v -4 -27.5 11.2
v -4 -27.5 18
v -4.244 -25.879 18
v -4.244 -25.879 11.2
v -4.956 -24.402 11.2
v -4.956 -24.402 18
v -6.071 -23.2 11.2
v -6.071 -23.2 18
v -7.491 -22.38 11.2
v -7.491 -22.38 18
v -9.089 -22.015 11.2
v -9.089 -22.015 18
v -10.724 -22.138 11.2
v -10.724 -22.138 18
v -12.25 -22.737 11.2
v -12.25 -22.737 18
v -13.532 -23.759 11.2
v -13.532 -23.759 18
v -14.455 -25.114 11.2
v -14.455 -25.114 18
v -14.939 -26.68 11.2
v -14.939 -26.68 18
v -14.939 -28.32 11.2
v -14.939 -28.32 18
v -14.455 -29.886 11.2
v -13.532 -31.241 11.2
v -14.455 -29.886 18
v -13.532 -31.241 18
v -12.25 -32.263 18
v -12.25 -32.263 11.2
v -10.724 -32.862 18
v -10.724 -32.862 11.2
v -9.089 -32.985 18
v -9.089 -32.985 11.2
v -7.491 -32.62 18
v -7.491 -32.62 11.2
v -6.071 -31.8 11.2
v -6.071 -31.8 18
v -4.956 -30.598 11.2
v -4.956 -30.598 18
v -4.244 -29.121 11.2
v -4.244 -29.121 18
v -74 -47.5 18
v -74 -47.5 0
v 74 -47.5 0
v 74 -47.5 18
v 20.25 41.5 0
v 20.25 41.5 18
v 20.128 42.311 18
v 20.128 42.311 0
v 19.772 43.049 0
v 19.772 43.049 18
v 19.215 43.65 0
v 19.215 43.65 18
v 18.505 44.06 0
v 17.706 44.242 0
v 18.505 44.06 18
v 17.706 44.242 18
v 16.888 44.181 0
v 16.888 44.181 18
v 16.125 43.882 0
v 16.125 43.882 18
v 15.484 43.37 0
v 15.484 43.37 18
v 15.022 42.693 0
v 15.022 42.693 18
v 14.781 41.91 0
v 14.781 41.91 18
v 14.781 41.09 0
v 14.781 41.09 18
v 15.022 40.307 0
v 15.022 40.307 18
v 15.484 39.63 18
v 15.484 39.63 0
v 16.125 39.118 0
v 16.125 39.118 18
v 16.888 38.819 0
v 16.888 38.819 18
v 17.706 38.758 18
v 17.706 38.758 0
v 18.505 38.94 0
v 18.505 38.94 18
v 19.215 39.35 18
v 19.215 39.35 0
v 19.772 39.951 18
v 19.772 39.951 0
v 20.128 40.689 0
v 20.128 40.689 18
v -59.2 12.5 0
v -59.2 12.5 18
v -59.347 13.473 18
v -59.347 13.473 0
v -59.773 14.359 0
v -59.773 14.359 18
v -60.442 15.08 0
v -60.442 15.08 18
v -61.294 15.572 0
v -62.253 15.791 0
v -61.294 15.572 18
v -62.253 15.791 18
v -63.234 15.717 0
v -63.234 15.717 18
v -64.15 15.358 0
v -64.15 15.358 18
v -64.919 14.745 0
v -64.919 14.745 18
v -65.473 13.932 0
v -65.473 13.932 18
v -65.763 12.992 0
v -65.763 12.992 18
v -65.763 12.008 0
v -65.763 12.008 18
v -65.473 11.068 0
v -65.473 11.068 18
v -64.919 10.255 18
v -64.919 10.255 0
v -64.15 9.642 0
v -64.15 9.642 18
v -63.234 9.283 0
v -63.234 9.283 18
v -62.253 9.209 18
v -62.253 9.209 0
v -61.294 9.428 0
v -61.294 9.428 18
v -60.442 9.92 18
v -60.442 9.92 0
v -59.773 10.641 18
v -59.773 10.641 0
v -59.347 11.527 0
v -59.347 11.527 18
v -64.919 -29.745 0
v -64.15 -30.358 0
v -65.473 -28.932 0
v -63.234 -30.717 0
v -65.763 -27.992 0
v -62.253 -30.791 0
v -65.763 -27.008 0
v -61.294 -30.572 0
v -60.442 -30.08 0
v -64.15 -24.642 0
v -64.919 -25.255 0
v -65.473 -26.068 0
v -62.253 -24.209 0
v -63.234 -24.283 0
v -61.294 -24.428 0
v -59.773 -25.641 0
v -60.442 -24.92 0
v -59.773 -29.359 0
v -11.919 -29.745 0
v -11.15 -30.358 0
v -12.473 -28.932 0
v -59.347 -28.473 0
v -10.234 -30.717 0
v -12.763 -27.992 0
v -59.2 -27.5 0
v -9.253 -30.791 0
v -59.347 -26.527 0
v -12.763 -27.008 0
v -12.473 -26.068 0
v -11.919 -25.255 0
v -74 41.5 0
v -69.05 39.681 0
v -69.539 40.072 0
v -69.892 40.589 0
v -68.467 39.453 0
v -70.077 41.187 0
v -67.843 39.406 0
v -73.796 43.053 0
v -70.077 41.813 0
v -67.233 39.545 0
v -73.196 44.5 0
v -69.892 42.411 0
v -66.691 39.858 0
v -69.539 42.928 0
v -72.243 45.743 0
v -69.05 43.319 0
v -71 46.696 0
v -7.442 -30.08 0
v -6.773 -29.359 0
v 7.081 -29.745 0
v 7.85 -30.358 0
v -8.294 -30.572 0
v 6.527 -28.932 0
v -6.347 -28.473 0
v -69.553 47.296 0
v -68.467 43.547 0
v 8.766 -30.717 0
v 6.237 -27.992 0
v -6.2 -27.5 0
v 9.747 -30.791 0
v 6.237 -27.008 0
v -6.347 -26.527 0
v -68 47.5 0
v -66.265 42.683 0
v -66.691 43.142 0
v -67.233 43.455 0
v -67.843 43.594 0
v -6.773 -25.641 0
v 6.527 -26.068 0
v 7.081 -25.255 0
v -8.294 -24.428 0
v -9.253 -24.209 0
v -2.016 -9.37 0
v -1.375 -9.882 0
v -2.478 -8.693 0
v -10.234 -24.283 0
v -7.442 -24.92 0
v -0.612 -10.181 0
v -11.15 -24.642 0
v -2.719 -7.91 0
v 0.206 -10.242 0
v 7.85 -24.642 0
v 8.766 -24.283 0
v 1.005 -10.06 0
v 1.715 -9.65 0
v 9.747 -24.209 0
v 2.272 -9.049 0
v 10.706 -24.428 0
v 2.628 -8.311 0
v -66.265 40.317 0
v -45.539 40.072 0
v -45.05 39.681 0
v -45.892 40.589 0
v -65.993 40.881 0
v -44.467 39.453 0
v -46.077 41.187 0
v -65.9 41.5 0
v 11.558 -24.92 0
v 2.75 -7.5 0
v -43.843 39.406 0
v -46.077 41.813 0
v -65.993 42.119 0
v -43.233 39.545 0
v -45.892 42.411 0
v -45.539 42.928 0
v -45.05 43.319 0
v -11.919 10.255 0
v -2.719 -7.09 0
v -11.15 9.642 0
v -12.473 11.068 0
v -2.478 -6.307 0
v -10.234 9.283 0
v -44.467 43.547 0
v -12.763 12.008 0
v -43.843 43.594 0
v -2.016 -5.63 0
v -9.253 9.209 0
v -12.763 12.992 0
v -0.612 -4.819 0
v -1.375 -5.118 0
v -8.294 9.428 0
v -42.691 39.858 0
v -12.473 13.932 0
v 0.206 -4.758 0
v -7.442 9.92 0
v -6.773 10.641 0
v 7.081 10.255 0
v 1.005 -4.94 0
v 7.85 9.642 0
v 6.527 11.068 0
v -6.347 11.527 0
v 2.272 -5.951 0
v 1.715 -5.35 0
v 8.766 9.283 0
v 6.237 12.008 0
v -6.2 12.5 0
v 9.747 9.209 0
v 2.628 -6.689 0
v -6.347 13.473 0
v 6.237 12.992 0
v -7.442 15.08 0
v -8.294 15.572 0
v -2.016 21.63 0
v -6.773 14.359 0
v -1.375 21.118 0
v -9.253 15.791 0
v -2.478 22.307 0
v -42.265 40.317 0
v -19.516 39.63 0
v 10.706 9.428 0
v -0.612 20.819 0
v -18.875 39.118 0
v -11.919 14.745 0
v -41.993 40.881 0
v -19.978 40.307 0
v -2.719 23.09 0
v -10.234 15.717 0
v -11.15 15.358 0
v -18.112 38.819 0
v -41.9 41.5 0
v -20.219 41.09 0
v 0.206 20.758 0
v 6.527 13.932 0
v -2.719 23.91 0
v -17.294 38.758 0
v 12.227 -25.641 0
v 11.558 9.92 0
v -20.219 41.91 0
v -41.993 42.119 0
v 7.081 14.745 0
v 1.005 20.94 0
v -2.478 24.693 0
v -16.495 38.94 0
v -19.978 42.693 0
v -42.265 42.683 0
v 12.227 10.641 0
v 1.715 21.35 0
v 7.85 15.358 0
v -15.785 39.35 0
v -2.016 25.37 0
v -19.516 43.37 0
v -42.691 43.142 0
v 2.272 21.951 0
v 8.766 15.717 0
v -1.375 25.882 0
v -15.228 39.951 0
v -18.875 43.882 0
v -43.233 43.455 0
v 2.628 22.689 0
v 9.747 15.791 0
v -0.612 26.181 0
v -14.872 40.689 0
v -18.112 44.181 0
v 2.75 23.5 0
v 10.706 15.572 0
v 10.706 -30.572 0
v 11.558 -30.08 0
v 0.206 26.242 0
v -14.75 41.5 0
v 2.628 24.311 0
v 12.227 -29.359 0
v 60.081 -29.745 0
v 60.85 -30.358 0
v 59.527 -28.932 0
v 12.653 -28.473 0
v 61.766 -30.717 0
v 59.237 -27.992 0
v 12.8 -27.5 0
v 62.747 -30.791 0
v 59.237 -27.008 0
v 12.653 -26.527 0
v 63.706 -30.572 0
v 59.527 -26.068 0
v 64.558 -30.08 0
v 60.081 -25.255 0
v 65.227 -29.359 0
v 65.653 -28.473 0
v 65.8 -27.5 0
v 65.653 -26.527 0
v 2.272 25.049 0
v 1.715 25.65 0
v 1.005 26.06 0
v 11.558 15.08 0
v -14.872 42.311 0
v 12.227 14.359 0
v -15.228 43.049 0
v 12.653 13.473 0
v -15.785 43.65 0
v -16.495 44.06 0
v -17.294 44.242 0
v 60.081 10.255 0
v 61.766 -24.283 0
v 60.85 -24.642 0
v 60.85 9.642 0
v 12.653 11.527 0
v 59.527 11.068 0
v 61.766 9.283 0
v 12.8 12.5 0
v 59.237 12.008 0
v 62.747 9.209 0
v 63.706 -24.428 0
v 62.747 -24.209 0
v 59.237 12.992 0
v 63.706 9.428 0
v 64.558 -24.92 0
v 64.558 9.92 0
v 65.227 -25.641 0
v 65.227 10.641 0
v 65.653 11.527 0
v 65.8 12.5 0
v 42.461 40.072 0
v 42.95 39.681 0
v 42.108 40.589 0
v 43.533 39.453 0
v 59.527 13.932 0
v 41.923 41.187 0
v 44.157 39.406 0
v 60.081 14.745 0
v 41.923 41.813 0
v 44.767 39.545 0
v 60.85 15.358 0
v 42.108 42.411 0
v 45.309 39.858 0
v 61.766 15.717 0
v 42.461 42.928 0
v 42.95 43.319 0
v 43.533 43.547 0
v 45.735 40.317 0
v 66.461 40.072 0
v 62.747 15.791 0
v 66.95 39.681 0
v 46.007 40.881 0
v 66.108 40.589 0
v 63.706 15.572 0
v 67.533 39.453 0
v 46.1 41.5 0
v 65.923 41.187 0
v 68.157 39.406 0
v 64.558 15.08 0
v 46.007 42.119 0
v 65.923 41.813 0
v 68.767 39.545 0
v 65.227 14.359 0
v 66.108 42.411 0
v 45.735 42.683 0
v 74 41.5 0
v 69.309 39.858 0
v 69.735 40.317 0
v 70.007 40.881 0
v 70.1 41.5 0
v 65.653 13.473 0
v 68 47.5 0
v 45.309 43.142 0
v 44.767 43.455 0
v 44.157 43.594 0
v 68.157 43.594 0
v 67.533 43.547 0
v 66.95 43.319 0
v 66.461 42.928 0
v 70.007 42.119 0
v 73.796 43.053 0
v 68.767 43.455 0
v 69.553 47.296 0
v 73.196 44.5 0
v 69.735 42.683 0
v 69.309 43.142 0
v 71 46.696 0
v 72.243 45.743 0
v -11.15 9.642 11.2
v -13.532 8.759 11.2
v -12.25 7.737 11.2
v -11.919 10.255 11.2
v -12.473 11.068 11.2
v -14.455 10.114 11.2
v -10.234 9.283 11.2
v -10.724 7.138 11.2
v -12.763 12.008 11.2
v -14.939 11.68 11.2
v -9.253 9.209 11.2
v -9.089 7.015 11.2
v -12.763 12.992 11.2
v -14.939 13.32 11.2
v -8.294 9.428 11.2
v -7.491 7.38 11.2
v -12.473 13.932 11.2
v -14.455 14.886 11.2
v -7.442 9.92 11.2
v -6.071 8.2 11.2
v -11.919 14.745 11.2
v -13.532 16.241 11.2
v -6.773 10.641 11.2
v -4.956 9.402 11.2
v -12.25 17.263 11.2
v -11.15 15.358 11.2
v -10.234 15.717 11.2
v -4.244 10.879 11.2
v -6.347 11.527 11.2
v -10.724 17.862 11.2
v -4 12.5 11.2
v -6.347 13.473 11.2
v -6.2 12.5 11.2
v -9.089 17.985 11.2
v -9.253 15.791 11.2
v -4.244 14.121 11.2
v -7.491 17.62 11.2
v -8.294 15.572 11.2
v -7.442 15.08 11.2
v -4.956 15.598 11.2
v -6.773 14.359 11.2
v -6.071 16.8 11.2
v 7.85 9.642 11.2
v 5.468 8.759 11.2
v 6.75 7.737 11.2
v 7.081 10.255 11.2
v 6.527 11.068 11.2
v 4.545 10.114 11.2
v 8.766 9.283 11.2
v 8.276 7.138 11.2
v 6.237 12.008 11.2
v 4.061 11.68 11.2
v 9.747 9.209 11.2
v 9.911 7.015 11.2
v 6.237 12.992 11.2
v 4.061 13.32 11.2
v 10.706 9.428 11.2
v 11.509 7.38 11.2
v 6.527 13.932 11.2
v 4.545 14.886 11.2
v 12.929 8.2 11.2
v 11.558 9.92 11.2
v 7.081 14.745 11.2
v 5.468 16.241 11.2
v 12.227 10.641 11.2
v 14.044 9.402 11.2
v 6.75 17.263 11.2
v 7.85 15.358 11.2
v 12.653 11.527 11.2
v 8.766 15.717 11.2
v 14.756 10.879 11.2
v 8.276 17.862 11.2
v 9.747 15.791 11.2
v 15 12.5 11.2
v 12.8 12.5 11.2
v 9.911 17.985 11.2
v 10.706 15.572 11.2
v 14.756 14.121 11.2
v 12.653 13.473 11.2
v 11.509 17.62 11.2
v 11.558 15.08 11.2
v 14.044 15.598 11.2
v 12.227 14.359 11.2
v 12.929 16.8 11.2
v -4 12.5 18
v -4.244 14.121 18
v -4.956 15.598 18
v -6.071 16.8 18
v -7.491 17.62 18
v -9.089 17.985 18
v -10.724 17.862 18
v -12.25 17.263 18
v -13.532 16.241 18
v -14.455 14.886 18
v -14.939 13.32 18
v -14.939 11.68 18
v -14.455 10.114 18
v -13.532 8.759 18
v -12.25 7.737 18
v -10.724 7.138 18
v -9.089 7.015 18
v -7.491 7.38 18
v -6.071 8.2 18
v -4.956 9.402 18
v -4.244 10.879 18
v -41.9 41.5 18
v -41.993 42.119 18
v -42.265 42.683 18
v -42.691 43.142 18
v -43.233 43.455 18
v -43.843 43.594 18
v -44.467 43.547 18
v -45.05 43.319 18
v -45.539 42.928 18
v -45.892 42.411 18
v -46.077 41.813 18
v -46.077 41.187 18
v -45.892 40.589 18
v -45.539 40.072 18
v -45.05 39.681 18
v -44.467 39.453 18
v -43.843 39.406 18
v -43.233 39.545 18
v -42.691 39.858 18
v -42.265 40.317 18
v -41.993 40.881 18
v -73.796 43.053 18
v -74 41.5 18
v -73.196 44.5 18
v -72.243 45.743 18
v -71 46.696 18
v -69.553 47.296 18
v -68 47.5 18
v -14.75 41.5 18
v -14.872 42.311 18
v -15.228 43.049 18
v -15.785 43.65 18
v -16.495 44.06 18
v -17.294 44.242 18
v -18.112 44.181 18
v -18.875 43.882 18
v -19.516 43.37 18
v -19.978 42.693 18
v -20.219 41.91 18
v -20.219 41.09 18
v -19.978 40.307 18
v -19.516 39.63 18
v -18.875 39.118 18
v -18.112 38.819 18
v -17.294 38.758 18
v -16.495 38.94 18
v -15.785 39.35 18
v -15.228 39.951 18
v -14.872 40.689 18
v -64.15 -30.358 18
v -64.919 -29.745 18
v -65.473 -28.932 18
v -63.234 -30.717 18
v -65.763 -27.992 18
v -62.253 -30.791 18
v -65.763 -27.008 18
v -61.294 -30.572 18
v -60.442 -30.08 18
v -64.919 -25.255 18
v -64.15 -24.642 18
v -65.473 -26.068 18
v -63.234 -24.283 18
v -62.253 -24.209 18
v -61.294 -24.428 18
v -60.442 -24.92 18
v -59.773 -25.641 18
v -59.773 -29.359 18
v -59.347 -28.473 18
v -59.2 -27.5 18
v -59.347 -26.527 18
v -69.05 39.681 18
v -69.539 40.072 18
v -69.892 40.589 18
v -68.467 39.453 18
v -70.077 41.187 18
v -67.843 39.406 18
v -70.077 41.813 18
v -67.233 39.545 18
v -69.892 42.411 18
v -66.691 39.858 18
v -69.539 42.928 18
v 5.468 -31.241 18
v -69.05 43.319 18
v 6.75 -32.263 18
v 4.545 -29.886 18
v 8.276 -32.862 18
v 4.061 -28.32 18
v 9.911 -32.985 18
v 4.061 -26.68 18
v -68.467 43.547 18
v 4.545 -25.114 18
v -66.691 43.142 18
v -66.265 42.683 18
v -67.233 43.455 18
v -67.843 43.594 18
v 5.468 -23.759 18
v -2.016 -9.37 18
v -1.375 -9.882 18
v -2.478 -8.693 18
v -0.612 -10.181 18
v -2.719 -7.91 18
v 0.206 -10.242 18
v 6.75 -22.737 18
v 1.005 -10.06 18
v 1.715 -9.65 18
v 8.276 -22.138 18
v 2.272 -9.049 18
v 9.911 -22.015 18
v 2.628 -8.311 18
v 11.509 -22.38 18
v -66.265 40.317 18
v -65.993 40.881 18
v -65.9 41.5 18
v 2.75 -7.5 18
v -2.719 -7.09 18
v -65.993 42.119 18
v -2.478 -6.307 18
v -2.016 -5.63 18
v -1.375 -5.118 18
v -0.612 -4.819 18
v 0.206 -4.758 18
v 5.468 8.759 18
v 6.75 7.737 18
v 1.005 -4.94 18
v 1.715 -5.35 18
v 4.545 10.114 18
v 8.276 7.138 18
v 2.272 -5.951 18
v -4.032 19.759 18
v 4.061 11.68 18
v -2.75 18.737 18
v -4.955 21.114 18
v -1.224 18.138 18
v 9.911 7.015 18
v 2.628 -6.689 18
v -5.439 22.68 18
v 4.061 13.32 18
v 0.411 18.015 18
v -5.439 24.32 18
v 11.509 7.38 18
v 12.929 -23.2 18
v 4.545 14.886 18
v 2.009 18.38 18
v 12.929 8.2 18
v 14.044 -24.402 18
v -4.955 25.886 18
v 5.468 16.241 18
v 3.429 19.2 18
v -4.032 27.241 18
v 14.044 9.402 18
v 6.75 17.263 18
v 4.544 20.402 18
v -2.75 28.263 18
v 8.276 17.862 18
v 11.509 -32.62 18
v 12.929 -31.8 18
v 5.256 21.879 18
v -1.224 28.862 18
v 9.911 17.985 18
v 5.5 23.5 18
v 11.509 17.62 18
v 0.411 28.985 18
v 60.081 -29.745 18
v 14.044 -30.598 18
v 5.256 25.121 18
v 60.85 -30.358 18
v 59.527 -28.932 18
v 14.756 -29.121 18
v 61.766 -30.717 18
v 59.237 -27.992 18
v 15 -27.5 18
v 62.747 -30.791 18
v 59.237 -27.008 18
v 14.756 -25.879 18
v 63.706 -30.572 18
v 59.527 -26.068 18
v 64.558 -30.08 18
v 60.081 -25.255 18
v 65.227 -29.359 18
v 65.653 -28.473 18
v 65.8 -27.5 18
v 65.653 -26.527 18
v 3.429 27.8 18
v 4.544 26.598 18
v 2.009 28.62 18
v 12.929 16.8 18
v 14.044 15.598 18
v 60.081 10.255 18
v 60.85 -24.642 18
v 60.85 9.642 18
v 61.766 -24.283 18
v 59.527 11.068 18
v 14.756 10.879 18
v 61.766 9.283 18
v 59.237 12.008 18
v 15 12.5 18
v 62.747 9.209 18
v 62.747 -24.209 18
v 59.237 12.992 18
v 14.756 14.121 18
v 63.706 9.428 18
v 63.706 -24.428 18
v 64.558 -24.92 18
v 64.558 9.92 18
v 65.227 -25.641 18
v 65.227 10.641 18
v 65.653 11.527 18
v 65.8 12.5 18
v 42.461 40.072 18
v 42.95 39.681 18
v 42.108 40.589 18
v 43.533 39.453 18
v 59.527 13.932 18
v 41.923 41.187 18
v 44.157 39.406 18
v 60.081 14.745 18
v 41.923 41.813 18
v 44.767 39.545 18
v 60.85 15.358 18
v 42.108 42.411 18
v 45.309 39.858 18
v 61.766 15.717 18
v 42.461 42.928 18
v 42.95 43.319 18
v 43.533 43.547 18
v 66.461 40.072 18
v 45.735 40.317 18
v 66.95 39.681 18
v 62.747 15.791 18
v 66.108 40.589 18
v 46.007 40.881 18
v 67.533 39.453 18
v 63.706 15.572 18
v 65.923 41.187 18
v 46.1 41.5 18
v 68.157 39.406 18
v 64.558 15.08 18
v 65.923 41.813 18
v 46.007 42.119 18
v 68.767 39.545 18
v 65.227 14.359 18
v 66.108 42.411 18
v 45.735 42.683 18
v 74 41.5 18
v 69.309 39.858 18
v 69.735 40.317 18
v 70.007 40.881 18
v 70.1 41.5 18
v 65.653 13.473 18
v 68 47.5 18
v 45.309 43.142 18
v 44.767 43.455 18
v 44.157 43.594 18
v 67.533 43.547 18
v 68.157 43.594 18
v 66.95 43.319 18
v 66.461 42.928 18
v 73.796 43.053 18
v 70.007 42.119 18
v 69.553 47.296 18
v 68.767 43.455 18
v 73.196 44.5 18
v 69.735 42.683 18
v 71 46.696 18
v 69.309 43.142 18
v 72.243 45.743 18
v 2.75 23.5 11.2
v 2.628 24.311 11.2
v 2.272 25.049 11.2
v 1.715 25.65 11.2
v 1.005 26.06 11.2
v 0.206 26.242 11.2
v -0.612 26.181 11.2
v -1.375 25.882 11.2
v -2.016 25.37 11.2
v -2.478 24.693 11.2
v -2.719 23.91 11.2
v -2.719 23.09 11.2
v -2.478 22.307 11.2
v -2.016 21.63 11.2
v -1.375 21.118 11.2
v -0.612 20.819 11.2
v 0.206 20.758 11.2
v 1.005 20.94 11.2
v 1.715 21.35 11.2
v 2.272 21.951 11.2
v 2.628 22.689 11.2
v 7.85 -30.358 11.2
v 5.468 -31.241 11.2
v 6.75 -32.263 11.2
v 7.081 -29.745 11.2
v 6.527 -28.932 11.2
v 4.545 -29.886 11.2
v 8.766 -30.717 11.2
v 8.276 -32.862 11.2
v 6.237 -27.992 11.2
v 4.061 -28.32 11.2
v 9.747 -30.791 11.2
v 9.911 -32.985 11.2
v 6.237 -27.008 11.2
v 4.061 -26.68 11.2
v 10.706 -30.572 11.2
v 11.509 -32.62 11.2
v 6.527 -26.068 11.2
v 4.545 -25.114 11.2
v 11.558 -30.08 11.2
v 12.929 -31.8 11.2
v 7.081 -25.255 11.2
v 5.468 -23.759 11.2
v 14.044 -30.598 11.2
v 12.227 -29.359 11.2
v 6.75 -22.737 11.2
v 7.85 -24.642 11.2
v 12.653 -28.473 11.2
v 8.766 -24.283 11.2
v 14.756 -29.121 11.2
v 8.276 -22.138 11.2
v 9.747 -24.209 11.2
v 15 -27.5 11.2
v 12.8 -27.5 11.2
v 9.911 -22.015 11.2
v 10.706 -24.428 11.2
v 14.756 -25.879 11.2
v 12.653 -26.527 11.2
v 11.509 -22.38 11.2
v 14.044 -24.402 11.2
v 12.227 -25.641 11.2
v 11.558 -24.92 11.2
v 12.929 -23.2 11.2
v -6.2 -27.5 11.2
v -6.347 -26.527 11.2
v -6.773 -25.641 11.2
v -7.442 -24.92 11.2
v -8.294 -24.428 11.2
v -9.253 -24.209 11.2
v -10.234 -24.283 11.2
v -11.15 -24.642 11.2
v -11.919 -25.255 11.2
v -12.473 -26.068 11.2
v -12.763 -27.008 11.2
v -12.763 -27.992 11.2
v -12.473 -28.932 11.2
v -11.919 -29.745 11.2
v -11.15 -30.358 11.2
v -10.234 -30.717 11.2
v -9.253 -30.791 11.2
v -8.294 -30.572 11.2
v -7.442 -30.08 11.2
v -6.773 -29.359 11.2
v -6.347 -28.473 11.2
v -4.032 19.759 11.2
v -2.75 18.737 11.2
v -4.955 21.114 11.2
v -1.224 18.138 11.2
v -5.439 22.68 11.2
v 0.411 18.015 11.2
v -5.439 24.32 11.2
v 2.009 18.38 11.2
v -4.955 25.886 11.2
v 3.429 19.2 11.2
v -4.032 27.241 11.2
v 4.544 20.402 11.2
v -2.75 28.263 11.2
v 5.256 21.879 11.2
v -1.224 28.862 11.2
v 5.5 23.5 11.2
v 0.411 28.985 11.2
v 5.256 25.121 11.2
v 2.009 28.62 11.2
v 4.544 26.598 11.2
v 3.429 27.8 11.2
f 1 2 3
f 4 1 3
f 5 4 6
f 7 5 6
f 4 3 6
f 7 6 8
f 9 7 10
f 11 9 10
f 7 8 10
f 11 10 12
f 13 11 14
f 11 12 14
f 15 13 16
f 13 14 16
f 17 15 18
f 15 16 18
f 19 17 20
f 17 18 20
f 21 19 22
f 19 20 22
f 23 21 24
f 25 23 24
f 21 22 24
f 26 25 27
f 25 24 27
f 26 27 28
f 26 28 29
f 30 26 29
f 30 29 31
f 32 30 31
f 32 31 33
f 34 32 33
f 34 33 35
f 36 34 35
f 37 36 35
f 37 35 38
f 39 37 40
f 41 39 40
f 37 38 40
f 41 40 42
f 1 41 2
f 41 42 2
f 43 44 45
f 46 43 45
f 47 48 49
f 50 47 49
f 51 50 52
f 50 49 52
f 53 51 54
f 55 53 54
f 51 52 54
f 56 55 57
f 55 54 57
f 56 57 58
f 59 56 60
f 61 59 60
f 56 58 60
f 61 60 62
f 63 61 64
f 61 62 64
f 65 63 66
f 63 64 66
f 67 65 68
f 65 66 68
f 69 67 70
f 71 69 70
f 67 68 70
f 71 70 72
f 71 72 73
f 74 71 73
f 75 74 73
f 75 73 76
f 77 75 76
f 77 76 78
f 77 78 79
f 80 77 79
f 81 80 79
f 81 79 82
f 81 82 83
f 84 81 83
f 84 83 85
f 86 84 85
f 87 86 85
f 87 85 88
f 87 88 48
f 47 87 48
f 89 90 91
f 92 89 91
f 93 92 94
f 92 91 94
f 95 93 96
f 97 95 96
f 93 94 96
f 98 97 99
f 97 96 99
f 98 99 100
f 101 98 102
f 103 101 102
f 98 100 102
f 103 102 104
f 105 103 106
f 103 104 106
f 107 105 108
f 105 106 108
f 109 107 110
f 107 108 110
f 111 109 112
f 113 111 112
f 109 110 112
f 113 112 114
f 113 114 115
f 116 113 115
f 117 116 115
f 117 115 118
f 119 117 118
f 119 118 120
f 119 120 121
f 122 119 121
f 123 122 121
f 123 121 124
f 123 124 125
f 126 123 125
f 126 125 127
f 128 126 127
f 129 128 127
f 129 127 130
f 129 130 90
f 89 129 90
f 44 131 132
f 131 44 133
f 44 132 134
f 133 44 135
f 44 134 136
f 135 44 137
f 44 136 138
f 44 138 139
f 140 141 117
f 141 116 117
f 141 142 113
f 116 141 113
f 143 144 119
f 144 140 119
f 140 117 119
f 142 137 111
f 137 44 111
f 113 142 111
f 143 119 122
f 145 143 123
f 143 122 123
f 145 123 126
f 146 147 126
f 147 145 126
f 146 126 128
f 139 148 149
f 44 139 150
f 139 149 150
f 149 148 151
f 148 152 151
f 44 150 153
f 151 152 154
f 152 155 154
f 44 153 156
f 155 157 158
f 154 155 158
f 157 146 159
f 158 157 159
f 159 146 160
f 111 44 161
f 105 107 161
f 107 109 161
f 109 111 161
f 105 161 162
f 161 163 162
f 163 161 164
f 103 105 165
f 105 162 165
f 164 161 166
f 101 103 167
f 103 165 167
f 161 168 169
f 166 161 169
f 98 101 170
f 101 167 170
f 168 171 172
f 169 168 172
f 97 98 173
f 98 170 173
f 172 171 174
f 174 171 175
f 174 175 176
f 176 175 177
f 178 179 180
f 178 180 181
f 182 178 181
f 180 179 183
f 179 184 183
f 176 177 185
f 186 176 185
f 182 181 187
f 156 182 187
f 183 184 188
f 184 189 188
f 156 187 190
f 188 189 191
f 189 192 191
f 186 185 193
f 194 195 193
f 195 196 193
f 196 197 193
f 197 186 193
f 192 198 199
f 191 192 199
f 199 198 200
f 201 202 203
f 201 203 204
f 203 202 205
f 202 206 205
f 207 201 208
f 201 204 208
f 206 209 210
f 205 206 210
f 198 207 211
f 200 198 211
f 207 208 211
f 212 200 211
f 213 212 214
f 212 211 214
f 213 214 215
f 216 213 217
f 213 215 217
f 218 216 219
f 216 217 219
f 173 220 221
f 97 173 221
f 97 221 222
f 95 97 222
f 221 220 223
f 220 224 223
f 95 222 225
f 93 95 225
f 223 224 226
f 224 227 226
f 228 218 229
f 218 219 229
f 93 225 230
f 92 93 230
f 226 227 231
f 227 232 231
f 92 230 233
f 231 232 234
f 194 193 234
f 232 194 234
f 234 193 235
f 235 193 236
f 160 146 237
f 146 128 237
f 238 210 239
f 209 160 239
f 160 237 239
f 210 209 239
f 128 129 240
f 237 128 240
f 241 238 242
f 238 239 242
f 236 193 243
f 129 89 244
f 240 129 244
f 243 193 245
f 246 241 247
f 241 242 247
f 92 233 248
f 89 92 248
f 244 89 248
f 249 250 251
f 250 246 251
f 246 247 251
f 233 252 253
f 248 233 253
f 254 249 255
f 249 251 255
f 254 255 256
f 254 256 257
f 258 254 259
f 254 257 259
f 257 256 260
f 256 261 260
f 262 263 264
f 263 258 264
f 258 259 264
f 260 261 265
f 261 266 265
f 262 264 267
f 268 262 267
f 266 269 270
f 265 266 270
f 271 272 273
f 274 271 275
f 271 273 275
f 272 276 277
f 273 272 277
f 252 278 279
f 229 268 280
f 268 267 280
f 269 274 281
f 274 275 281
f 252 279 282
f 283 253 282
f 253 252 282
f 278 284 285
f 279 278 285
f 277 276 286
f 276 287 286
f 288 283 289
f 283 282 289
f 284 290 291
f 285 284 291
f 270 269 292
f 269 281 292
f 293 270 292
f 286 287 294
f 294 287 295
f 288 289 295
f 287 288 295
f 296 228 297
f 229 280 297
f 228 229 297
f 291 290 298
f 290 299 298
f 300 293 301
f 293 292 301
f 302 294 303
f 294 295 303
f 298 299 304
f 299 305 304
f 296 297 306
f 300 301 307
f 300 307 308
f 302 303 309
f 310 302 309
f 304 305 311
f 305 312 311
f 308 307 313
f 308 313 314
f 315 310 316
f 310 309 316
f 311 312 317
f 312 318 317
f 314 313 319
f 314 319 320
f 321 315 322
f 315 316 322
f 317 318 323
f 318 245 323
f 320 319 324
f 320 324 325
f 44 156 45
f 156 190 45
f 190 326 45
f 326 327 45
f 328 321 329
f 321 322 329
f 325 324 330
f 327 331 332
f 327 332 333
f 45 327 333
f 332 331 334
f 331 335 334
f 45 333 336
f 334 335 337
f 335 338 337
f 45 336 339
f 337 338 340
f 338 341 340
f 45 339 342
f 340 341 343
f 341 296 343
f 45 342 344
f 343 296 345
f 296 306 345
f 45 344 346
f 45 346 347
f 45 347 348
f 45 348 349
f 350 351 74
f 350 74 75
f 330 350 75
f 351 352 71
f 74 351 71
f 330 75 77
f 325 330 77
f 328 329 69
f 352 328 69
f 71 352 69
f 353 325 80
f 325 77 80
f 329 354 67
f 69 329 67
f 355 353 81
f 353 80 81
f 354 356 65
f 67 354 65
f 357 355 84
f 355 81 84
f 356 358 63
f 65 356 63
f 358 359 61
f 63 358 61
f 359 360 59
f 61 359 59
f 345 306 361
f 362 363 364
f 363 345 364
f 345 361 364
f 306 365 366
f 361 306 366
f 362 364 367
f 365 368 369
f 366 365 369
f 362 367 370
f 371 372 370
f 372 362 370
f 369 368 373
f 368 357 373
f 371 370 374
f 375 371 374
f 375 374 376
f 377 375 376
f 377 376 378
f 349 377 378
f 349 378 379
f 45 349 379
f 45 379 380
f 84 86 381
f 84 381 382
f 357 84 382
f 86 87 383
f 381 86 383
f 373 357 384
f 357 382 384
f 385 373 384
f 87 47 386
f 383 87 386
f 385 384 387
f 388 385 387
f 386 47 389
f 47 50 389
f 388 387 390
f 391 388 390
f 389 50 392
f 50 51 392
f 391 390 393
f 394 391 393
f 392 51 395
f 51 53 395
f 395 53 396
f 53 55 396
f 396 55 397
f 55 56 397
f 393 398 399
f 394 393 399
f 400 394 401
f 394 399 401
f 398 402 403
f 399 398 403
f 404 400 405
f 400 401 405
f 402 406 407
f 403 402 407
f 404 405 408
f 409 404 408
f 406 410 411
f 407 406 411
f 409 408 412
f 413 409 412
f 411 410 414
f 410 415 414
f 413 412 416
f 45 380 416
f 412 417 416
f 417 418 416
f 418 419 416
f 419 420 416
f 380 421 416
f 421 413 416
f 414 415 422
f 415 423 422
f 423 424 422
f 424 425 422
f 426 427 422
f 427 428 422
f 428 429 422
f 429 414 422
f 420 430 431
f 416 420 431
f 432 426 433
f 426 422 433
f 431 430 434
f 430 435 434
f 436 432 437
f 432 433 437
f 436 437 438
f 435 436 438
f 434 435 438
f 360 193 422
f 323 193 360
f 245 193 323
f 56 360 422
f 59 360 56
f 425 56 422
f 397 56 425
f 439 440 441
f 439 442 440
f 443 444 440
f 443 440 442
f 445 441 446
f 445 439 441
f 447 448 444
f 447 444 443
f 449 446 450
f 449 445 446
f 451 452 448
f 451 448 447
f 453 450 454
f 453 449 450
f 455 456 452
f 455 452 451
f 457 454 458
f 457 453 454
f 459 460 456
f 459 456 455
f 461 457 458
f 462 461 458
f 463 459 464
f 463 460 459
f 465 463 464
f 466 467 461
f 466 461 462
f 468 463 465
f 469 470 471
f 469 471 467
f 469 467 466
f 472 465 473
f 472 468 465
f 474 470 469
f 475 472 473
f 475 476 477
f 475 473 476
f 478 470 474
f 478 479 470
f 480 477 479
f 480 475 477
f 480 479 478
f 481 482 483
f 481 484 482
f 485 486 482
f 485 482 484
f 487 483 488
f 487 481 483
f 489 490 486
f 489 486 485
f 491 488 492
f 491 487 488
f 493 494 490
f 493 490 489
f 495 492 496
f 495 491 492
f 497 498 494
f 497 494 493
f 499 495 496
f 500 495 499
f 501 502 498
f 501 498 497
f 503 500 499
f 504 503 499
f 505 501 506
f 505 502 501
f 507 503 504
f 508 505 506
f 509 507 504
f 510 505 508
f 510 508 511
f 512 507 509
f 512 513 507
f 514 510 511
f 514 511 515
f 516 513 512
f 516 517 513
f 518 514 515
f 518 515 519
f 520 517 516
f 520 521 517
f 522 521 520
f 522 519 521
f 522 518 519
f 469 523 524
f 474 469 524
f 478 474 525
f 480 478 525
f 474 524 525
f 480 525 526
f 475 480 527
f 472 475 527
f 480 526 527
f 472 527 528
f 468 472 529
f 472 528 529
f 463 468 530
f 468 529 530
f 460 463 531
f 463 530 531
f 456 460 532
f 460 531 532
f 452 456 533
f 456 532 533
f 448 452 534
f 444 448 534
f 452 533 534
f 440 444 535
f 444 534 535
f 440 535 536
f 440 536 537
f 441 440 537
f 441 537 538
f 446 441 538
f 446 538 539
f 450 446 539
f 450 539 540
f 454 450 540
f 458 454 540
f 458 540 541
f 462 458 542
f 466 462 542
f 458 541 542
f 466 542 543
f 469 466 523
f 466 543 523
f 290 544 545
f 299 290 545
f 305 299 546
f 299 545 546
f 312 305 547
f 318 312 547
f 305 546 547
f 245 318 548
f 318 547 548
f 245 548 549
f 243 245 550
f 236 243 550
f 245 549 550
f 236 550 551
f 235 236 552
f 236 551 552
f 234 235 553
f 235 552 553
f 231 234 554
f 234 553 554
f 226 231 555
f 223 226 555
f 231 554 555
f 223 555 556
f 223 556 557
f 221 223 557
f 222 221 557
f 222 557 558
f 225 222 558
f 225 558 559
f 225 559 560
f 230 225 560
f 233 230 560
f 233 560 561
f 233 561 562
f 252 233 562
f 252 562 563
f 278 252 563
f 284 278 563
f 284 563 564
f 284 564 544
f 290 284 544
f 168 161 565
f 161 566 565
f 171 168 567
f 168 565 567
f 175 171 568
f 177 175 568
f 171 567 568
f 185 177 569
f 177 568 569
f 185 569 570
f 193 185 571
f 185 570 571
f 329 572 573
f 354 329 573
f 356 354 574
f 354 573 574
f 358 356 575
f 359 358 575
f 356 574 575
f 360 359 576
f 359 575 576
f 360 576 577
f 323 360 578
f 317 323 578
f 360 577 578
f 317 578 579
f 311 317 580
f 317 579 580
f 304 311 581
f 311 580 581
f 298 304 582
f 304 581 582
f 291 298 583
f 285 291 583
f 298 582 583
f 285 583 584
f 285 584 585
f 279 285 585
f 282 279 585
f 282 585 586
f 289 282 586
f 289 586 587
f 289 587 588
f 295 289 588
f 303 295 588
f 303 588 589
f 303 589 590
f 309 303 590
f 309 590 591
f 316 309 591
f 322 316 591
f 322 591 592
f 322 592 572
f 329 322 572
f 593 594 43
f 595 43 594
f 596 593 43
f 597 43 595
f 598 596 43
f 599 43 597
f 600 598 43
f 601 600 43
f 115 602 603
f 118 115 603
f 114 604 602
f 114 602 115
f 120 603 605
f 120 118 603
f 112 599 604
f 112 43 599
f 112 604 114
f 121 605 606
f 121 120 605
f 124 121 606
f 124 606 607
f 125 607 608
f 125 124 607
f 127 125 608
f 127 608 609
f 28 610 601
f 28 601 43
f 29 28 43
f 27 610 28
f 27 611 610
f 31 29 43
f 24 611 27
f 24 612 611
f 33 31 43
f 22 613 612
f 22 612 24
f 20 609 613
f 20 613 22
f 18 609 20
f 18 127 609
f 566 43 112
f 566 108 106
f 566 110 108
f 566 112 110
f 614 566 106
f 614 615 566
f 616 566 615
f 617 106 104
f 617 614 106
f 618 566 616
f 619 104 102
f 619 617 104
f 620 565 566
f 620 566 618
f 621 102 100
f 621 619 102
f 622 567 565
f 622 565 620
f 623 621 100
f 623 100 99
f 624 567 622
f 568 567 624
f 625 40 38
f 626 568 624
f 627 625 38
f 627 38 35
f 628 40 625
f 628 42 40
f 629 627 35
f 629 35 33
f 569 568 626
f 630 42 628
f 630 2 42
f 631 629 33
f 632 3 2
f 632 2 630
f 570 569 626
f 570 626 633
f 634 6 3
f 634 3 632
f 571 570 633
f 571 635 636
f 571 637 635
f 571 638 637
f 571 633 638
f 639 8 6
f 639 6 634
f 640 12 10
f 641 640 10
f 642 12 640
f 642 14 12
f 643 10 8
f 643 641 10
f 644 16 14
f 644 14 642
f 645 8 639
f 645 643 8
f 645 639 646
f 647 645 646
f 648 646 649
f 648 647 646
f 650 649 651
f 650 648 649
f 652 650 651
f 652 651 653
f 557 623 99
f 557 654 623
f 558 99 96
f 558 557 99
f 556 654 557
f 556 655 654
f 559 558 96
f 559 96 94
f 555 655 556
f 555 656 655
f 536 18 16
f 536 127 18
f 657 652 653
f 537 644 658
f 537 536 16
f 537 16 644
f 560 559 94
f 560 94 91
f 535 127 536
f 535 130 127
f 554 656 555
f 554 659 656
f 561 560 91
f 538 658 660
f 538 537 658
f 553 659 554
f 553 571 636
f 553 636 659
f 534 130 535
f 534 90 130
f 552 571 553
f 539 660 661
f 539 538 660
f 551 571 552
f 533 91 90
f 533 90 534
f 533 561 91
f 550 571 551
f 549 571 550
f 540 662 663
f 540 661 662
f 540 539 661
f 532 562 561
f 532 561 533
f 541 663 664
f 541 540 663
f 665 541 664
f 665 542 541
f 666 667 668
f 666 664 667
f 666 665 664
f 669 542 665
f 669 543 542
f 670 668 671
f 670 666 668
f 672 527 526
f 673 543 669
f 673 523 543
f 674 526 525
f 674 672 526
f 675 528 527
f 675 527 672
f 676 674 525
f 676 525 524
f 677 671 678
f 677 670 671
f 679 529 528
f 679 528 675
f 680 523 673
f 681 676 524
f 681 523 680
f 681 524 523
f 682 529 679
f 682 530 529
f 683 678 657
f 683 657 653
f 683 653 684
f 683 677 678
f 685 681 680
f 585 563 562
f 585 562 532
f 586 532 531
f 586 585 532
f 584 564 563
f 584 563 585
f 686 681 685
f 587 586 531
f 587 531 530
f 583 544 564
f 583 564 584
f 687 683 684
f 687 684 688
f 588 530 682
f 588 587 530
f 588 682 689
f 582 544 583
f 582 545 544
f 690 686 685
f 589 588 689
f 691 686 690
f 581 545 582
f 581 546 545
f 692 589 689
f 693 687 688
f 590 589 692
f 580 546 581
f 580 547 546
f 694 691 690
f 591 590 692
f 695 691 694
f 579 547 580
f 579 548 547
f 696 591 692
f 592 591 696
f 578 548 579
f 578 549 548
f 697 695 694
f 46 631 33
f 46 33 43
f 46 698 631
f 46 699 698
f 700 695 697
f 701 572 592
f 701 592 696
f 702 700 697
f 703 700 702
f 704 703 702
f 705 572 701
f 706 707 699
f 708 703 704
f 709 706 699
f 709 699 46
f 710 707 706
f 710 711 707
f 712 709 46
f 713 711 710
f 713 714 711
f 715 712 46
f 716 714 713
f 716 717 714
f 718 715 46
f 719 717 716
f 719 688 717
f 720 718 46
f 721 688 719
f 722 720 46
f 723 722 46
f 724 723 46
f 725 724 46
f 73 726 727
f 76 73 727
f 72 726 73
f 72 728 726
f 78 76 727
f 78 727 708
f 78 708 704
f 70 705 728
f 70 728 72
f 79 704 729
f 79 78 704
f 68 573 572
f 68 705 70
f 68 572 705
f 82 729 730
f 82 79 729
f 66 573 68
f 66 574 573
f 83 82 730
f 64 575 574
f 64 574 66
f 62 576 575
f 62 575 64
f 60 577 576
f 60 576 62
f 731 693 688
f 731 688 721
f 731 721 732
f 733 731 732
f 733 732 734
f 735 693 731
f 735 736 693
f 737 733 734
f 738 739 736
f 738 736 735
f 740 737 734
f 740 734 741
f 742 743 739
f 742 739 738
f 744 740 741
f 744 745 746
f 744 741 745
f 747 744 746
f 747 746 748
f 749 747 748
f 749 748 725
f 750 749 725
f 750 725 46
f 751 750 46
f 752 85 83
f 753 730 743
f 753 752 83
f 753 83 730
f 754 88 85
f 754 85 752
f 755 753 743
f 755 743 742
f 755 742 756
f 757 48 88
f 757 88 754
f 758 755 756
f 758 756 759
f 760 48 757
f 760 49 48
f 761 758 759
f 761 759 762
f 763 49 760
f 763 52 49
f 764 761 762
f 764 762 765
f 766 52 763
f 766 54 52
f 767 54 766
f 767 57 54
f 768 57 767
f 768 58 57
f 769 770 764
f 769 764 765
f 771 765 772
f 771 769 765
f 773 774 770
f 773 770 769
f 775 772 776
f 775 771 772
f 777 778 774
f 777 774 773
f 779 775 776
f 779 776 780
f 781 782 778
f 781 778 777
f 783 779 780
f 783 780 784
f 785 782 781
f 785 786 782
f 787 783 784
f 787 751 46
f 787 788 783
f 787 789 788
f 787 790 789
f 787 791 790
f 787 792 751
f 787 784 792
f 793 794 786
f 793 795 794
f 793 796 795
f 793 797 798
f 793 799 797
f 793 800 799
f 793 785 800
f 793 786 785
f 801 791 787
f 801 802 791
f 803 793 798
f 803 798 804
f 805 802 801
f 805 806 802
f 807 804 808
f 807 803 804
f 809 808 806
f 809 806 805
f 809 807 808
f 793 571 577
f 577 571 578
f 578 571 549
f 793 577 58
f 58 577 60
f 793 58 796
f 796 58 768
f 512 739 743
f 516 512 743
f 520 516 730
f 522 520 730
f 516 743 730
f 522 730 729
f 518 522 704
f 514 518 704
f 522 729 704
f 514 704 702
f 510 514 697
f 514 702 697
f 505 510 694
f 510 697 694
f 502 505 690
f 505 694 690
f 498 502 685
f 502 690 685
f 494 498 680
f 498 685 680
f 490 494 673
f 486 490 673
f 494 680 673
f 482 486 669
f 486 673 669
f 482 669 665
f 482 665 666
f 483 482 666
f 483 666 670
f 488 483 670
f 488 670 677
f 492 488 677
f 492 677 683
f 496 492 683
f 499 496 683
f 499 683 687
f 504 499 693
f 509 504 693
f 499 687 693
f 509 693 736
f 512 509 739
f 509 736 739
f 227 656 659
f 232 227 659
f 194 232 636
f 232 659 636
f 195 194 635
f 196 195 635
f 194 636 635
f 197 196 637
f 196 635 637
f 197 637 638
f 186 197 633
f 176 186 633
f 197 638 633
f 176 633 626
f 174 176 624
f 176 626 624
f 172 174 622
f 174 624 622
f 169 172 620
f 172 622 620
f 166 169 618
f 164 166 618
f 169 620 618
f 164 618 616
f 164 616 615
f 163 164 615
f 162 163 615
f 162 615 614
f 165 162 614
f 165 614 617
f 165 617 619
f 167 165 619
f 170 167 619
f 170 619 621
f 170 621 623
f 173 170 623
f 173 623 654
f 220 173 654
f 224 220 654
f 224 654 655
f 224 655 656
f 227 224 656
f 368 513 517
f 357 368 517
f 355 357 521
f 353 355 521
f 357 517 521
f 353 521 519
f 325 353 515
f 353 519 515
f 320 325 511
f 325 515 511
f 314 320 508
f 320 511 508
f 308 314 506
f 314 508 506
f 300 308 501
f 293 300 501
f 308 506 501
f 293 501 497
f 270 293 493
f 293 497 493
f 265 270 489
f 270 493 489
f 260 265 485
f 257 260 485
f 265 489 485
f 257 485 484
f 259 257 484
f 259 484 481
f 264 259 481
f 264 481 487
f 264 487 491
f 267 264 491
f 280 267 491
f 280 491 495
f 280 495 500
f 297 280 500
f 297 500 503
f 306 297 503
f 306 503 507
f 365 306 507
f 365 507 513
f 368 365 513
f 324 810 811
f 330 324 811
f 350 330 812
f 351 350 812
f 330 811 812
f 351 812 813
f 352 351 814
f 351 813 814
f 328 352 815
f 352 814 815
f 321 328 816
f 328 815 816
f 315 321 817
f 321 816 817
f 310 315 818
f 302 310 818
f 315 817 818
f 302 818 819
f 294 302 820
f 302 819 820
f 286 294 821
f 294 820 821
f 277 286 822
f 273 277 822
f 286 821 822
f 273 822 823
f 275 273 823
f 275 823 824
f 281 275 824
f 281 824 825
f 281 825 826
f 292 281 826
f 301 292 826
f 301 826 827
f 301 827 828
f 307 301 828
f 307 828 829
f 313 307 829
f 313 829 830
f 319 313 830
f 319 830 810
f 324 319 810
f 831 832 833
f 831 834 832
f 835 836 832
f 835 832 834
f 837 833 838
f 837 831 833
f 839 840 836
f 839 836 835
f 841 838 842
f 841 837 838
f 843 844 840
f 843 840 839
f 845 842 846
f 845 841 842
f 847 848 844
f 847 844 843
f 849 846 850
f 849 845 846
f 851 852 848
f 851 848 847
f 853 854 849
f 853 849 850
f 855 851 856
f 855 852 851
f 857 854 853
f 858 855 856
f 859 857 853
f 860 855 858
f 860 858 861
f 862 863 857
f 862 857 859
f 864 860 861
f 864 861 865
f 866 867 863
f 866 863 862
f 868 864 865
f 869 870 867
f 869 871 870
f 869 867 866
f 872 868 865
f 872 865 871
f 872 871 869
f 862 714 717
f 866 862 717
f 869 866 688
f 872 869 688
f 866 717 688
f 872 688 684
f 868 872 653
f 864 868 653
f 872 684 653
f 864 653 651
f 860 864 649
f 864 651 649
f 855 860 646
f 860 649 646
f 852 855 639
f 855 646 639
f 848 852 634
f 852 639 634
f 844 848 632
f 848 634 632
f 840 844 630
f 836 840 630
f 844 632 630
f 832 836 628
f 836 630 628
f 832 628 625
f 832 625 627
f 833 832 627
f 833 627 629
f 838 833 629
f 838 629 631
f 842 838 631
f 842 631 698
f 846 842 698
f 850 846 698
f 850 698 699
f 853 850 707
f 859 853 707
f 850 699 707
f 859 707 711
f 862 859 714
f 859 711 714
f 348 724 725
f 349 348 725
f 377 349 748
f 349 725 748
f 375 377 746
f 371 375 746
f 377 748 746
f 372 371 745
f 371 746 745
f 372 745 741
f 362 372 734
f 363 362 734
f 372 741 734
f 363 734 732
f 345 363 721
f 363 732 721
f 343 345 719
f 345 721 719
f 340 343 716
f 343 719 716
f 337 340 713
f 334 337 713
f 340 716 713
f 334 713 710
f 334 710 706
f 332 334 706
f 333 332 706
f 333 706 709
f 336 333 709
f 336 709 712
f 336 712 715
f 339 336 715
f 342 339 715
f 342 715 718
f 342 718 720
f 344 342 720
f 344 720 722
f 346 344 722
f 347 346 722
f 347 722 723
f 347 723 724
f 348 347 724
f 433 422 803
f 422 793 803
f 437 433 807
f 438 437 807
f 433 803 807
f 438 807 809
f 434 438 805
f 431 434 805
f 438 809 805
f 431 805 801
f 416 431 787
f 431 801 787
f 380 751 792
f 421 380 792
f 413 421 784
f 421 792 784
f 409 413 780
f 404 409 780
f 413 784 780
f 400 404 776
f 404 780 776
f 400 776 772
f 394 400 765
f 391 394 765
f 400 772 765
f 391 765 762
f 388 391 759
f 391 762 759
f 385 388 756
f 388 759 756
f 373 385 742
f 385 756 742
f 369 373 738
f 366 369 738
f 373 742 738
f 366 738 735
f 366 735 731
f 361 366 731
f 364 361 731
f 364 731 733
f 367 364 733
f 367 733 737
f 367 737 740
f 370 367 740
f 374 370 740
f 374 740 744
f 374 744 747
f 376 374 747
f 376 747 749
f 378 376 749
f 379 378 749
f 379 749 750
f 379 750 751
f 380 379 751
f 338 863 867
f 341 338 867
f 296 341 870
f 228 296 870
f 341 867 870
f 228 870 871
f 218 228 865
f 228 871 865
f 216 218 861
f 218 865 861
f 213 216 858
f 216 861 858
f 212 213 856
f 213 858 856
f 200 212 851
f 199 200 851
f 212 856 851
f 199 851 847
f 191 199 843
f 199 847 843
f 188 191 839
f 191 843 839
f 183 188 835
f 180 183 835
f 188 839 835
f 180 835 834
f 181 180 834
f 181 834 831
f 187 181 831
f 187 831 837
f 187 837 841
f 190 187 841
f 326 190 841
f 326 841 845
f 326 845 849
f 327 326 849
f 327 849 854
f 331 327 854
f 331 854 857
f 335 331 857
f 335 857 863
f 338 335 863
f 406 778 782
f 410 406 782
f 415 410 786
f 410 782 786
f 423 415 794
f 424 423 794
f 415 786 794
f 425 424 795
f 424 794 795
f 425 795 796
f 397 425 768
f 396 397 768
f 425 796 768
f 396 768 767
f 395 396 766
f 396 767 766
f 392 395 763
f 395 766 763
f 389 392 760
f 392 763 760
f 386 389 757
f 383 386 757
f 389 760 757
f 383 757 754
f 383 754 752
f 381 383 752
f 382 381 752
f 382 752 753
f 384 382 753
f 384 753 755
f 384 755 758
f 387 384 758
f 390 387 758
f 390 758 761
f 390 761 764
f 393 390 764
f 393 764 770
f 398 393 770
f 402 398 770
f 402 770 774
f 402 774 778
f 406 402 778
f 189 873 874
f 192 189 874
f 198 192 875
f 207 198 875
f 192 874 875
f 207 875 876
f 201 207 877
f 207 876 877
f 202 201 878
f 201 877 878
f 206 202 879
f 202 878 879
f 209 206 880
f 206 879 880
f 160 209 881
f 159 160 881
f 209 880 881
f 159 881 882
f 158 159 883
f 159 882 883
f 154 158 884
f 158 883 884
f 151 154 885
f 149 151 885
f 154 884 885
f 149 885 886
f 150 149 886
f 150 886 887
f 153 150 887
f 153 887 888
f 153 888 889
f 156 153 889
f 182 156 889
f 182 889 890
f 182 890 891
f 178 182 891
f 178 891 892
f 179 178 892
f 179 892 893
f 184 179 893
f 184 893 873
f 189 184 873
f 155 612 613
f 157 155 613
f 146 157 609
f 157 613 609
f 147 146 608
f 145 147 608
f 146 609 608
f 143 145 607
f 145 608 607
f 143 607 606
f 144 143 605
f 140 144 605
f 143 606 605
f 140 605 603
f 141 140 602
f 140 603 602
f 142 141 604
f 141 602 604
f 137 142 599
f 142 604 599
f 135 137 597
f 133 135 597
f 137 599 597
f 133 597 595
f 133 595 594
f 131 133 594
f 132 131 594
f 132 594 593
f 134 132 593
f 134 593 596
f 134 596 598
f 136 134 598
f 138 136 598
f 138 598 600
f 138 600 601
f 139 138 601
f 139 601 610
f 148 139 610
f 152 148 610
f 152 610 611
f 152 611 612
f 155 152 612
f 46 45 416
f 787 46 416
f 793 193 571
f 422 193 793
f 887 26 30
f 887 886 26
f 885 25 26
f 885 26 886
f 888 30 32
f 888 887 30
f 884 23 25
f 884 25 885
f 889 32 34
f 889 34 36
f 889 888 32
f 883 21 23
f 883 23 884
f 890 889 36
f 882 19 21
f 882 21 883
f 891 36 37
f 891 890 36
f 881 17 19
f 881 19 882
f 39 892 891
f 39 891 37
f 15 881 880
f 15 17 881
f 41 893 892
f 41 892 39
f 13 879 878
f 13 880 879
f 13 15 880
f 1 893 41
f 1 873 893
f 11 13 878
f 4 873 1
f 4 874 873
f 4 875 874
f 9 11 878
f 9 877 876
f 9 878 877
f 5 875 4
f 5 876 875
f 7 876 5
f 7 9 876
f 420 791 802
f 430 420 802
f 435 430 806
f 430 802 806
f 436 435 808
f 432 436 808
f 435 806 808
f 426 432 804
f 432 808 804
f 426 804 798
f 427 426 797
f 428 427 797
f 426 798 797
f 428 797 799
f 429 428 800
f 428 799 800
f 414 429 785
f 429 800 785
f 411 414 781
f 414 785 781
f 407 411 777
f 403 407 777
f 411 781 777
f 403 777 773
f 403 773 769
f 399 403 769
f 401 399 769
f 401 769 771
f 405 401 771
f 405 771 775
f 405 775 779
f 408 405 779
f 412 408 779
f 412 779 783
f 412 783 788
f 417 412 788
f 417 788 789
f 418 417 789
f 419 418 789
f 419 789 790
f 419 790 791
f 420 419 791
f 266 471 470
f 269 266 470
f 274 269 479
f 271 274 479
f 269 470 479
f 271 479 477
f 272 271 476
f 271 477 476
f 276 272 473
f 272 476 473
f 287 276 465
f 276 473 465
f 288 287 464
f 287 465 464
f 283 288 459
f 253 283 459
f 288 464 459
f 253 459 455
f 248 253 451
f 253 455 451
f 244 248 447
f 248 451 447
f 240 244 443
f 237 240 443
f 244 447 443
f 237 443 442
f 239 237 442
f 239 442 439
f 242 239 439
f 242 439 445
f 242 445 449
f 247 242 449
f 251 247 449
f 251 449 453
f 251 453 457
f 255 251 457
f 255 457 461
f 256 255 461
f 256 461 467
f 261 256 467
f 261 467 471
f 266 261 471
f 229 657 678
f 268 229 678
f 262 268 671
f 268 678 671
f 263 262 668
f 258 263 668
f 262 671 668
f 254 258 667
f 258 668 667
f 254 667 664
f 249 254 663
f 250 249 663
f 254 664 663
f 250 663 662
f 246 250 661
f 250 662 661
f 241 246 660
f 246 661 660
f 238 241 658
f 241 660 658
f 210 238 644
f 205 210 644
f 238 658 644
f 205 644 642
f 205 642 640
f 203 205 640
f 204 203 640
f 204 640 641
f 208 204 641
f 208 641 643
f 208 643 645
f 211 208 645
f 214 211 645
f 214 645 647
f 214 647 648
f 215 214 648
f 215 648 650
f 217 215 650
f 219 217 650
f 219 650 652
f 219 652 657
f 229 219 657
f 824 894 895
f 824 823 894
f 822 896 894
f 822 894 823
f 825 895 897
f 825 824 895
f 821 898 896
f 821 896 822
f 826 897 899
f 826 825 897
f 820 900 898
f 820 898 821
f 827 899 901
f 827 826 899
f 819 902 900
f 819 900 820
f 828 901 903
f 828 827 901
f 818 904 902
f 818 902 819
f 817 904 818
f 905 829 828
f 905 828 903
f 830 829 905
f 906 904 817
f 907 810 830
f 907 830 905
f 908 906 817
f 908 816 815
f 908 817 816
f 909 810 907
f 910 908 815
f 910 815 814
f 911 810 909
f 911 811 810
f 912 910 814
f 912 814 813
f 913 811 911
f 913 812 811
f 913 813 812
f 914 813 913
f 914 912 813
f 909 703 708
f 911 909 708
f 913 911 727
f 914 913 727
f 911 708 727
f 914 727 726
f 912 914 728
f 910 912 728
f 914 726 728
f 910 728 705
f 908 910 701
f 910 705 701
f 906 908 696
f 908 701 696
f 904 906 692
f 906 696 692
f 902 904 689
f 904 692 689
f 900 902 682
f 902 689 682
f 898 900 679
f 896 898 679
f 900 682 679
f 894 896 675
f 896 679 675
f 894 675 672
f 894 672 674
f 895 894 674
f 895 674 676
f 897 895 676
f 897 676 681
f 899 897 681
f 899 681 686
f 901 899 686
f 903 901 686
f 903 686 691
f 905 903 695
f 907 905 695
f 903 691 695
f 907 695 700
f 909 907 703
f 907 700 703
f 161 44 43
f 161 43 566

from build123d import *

# Parameters (mm, degrees)
SKETCH_W        = 148
SKETCH_H        = 95
PAD_DEPTH       = 18
SKETCH001_R     = 3.3
SKETCH001_R_2   = 2.75
SKETCH001_R_3   = 2.1
POCKET_DEPTH    = 18.001
SKETCH002_R     = 5.5
POCKET001_DEPTH = 6.8
FILLET_R        = 6
SKETCH003_R     = 2.75
POCKET002_DEPTH = 18.001


with BuildPart() as part:
    # Sketch → Pad (new body)
    with BuildSketch(Plane.XY):
        Rectangle(SKETCH_W, SKETCH_H)
    extrude(amount=PAD_DEPTH)

    # Sketch001 (on Face6 of Pad) → Pocket (cut, through all)
    with BuildSketch(Plane.XY.offset(18)):
        with Locations((-62.5, 12.5)):
            Circle(SKETCH001_R)
        with Locations((-62.5, -27.5)):
            Circle(SKETCH001_R)
        with Locations((-9.5, 12.5)):
            Circle(SKETCH001_R)
        with Locations((-9.5, -27.5)):
            Circle(SKETCH001_R)
        with Locations((0, -7.5)):
            Circle(SKETCH001_R_2)
        with Locations((0, 23.5)):
            Circle(SKETCH001_R_2)
        with Locations((-68, 41.5)):
            Circle(SKETCH001_R_3)
        with Locations((-44, 41.5)):
            Circle(SKETCH001_R_3)
        with Locations((-17.5, 41.5)):
            Circle(SKETCH001_R_2)
        with Locations((9.5, -27.5)):
            Circle(SKETCH001_R)
        with Locations((9.5, 12.5)):
            Circle(SKETCH001_R)
        with Locations((17.5, 41.5)):
            Circle(SKETCH001_R_2)
        with Locations((44, 41.5)):
            Circle(SKETCH001_R_3)
        with Locations((68, 41.5)):
            Circle(SKETCH001_R_3)
        with Locations((62.5, 12.5)):
            Circle(SKETCH001_R)
        with Locations((62.5, -27.5)):
            Circle(SKETCH001_R)
    extrude(amount=-POCKET_DEPTH, mode=Mode.SUBTRACT)

    # Sketch002 → Pocket001 (cut)
    with BuildSketch(Plane.XY.offset(18)):
        with Locations((-9.5, 12.5)):
            Circle(SKETCH002_R)
        with Locations((9.5, 12.5)):
            Circle(SKETCH002_R)
        with Locations((-9.5, -27.5)):
            Circle(SKETCH002_R)
        with Locations((9.5, -27.5)):
            Circle(SKETCH002_R)
        with Locations((0, 23.5)):
            Circle(SKETCH002_R)
    extrude(amount=-POCKET001_DEPTH, mode=Mode.SUBTRACT)

    # Fillet
    fillet_edges = [part.edges().sort_by_distance(p)[0] for p in [
        (-74, 47.5, 9),
        (74, 47.5, 9),
    ]]
    fillet(fillet_edges, radius=FILLET_R)

    # Sketch003 (on Face5 of Fillet) → Pocket002 (cut, through all)
    with BuildSketch(Plane.XY.offset(18)):
        with Locations((0, -7.5)):
            Circle(SKETCH003_R)
        with Locations((0, 23.5)):
            Circle(SKETCH003_R)
    extrude(amount=-POCKET002_DEPTH, mode=Mode.SUBTRACT)


solid = part.part
